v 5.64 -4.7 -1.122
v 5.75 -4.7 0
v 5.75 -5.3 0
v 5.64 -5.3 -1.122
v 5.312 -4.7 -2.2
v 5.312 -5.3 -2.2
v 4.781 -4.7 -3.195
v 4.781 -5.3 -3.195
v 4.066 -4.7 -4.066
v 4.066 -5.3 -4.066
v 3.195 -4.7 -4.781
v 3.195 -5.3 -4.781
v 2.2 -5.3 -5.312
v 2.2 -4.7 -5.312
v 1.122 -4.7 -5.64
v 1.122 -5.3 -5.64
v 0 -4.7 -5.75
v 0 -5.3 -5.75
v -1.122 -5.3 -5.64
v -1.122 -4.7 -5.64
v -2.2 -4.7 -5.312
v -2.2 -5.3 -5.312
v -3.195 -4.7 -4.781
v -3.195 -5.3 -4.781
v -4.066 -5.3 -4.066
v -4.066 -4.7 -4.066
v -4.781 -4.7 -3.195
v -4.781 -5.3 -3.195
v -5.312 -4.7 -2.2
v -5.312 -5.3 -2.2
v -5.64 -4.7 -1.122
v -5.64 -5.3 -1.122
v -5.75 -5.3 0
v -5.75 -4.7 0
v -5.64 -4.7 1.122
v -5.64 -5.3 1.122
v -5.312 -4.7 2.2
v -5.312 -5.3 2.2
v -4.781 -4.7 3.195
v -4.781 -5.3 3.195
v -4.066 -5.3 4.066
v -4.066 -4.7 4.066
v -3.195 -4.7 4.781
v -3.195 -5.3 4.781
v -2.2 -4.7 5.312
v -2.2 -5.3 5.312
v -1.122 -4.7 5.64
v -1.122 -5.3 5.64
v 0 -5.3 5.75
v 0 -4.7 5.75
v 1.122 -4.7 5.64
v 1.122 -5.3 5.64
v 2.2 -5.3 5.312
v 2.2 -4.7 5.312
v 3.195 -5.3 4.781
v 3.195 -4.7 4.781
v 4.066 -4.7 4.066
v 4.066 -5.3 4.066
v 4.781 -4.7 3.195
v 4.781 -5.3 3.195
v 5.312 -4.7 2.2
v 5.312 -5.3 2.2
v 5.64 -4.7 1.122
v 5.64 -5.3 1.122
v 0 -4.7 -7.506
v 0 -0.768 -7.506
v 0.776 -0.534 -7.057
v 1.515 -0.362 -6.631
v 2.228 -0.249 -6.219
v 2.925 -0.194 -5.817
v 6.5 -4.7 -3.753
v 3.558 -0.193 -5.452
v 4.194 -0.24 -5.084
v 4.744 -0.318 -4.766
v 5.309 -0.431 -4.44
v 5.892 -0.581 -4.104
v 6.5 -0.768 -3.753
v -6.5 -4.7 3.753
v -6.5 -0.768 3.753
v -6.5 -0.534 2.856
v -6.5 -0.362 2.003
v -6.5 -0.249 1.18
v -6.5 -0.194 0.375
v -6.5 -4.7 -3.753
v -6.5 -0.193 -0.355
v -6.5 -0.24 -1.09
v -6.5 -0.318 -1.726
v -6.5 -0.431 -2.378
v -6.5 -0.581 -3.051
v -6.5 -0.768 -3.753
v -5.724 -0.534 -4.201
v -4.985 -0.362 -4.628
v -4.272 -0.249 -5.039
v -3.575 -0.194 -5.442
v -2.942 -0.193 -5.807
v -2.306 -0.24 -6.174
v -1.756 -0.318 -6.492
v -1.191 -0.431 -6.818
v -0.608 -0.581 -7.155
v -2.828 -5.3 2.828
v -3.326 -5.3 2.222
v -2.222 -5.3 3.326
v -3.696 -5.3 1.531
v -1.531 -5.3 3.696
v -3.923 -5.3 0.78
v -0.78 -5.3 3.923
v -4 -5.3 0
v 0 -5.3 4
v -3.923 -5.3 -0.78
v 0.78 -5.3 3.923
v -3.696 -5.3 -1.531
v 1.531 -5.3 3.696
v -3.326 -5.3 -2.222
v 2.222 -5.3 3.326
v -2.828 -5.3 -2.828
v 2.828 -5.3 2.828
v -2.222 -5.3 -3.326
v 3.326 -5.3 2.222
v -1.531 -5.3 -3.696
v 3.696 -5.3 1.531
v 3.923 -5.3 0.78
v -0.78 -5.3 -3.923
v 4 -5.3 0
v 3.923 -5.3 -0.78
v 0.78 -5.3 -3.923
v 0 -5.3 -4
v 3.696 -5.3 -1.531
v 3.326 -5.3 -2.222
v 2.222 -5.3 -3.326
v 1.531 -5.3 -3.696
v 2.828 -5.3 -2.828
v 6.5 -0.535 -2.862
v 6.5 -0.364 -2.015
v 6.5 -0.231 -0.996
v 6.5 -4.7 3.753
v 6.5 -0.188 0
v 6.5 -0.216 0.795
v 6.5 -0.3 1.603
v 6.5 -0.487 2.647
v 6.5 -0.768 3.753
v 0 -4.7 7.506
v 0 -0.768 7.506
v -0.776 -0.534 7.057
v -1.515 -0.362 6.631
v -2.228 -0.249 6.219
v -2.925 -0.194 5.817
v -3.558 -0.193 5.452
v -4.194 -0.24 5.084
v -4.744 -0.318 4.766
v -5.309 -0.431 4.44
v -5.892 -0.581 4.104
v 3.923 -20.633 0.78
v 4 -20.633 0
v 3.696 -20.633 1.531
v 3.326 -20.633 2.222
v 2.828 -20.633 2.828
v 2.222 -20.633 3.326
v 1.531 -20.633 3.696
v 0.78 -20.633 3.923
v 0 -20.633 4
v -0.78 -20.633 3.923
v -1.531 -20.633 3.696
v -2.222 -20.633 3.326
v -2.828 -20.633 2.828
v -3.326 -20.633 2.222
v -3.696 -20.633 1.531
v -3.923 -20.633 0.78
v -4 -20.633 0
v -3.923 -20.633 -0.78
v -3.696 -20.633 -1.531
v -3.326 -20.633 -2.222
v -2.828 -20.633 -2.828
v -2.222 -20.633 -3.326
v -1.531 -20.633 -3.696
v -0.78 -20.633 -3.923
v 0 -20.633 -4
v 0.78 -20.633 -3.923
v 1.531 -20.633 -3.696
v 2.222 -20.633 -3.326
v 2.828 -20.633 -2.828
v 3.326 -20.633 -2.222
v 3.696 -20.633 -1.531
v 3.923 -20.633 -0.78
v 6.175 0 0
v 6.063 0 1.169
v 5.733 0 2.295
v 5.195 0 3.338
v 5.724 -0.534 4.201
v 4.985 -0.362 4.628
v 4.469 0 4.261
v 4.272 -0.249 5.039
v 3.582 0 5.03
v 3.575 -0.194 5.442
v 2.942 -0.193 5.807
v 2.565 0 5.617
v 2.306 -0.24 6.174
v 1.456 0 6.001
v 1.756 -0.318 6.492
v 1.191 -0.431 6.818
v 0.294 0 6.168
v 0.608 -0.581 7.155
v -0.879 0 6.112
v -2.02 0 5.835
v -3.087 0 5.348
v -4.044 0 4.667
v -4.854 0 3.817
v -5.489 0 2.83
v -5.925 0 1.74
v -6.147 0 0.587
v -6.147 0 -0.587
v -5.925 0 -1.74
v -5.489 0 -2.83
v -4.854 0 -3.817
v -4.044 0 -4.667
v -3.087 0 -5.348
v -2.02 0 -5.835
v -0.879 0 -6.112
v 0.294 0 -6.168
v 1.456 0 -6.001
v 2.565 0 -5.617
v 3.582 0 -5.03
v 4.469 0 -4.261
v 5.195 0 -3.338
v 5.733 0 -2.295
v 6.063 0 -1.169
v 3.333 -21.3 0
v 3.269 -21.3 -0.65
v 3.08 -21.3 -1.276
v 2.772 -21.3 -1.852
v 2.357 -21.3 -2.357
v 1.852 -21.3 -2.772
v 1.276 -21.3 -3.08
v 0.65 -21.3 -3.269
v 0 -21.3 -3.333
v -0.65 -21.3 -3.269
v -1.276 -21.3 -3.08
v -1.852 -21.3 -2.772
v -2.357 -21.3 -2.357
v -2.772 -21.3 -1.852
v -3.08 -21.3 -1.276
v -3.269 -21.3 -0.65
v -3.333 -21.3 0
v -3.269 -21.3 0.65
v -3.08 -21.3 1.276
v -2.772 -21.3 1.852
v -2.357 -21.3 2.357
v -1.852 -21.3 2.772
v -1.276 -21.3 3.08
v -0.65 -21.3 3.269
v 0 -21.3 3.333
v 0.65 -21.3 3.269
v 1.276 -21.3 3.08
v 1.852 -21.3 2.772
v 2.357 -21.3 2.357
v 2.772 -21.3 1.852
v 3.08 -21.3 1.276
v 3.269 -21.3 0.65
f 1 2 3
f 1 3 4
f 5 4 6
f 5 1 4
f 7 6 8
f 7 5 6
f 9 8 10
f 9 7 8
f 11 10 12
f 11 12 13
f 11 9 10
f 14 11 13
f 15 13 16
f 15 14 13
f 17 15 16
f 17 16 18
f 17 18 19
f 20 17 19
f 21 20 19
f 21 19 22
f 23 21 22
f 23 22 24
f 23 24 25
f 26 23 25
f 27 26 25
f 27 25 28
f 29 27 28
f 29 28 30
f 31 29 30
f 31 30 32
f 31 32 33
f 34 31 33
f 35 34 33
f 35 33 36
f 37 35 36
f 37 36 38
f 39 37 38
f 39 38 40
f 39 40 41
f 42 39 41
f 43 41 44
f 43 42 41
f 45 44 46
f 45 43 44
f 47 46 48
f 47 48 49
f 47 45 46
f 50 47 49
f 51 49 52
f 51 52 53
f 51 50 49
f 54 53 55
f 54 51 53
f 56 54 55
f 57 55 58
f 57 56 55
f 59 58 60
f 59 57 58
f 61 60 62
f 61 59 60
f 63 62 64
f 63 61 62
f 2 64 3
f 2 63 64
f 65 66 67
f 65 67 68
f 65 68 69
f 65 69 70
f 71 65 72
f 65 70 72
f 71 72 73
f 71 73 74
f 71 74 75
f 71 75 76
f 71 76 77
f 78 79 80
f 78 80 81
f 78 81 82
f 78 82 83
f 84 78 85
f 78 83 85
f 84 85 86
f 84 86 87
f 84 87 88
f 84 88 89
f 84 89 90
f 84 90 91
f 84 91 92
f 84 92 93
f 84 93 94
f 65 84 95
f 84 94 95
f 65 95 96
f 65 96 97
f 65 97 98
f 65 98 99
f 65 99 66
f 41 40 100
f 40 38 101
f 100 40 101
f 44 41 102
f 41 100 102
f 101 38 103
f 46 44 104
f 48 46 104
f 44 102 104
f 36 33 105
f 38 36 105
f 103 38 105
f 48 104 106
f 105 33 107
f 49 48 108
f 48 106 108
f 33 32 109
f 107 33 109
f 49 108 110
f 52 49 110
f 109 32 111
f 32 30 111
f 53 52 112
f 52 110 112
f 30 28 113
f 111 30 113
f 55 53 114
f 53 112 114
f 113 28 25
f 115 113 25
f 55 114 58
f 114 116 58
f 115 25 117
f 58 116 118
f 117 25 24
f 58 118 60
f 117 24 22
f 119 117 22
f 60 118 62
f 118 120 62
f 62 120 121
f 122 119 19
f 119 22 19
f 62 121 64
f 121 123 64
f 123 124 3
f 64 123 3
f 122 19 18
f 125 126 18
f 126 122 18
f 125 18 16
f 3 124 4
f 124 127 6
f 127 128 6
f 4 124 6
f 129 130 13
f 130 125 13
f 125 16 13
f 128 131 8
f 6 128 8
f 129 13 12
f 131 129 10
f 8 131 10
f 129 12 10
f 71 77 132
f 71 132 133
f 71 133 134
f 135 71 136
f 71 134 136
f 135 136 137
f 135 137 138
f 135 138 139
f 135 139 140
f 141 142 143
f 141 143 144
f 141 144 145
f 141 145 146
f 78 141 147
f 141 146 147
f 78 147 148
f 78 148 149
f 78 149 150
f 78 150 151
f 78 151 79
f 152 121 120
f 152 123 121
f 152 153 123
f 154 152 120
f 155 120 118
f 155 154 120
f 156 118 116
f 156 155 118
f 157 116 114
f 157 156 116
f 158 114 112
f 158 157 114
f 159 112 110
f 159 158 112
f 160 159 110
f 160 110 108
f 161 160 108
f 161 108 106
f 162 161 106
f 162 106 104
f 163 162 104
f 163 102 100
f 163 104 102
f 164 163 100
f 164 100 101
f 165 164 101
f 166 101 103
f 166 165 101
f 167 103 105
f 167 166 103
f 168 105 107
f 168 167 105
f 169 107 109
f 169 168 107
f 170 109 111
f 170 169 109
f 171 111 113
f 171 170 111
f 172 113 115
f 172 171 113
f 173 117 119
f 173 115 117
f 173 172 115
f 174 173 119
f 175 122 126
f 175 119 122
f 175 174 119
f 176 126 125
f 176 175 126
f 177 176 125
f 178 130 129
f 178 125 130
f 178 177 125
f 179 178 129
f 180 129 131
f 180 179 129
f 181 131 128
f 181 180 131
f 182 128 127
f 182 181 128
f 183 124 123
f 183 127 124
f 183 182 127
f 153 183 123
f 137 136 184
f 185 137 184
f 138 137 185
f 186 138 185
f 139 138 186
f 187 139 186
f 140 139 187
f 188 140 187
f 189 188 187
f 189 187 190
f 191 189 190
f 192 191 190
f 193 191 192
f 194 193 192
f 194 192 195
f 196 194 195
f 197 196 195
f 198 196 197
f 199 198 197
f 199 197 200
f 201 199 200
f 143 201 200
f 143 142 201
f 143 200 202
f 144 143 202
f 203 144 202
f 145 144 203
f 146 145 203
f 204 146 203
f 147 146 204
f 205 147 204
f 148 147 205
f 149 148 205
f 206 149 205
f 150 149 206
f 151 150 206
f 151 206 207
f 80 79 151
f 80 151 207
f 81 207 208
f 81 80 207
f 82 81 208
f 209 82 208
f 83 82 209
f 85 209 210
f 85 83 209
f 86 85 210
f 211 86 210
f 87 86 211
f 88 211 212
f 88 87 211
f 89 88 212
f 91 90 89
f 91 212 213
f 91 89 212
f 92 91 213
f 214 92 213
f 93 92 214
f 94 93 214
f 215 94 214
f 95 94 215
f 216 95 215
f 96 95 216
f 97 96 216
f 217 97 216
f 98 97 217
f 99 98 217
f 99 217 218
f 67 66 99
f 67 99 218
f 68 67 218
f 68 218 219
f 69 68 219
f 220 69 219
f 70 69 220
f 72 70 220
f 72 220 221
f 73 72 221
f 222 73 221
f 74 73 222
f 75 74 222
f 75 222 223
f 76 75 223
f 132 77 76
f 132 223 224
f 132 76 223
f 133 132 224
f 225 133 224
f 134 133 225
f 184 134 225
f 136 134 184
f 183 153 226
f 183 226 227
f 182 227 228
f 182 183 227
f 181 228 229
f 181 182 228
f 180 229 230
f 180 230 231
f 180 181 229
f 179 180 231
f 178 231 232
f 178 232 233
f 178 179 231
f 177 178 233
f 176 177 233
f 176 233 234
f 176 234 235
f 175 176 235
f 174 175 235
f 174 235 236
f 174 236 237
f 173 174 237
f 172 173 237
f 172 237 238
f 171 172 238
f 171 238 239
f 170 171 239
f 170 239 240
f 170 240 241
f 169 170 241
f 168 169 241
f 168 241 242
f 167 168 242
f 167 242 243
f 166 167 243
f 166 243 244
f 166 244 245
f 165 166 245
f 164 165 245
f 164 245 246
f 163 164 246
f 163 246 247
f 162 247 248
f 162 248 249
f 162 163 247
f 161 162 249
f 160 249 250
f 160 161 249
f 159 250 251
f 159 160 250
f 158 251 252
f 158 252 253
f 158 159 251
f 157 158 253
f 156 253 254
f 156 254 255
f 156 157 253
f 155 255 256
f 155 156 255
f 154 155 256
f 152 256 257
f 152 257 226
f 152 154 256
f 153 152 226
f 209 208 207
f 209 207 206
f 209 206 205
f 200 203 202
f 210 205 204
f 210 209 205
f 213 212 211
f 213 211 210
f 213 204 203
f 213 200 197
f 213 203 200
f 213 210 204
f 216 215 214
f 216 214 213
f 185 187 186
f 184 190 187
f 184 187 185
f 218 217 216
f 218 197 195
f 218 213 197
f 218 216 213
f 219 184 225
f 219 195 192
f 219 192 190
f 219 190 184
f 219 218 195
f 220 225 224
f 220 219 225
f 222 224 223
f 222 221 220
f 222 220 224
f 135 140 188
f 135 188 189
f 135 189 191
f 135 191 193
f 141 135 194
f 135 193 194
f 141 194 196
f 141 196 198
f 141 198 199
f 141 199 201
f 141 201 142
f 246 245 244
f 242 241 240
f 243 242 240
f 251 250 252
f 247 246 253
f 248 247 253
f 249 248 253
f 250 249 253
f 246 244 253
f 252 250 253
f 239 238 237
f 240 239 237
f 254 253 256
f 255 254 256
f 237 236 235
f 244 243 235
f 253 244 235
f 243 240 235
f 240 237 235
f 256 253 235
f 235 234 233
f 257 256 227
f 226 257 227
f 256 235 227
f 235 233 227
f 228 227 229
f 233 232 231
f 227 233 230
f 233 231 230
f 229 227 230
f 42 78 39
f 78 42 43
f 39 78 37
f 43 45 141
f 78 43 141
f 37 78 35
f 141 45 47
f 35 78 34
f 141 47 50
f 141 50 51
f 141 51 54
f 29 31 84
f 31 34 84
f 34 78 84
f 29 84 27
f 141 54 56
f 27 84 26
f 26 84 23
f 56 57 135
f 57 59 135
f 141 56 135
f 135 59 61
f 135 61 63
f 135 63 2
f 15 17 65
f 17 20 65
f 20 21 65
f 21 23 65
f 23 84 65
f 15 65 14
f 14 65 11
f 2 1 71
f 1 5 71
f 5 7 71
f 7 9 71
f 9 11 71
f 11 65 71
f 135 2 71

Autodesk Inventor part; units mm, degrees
ref_plane "YZ Plane" through (0, 0, 0) normal (1, 0, 0) x (0, 1, 0)
ref_plane "XZ Plane" through (0, 0, 0) normal (0, 1, 0) x (-1, 0, 0)
ref_plane "XY Plane" through (0, 0, 0) normal (0, 0, 1) x (1, 0, 0)
sketch "Sketch1" plane through (0, 0, 0) normal (0, 0, 1) x (1, 0, 0)
  line L0 (0, 0) -> (6.175, 0)
  line L1 (9.75, -2.064) -> (9.75, -4.7)
  line L2 (5.75, -5.3) -> (4, -5.3)
  line L3 (4, -5.3) -> (4, -21.3)
  line L4 (4, -21.3) -> (0, -21.3)
  line L5 (0, -21.3) -> (0, 0)
  line L6 (5.75, -5.3) -> (5.75, -4.7)
  line L7 (5.75, -4.7) -> (9.75, -4.7)
  line L8 (6.175, 0) -> (9.75, -2.064)
  dimension "d0" = 19.5
  dimension "d1" = 8
  dimension "d3" = 16
  dimension "d4" = 11.5
  dimension "d5" = 0.6
  dimension "d22" = 30
  dimension "d23" = 12.35
  dimension "d24" = 5.3
revolve "Revolution1" add sketch "Sketch1" angle 360 about axis through (0, -21.3, 0) along (0, 1, 0)
sketch "Sketch2" plane through (0, 0, 0) normal (0, 1, 0) x (1, 0, 0)
  line L0 (0, -7.5056) -> (-6.5, -3.7528)
  line L1 (-6.5, -3.7528) -> (-6.5, 3.7528)
  line L2 (-6.5, 3.7528) -> (0, 7.5056)
  line L3 (0, 7.5056) -> (6.5, 3.7528)
  line L4 (6.5, 3.7528) -> (6.5, -3.7528)
  line L5 (6.5, -3.7528) -> (0, -7.5056)
  circle A0 centre (0, 0) radius 9.75 projected
  point P0 (0, 0)
  point P1 (0, 0)
  dimension "d25" = 13
extrude "Extrusion1" cut sketch "Sketch2" against normal blind 5.3
thread "Thread1" size "M8x1.25" class "6g" standard "ISO Metric profile" length 15
chamfer "Chamfer1" distance 0.6667 angle 45 1 edges at (-4, -21.3, 0)
equation "\"d0\" = 1.5 * S_"
equation "\"d1\" = d1_"
equation "\"d3\" = L"
equation "\"d4\" = dw"
equation "\"d5\" = hw"
equation "\"d23\" = 0.95 * S_"
equation "\"d24\" = k"
equation "\"d14\" = b"
equation "\"d16\" = 0.0833333 * d"
equation "\"d25\" = S_"
equation "\"d26\" = k"
equation "\"d\" = 8"
equation "\"d1_\" = 8"
equation "\"S_\" = 13"
equation "\"k\" = 5.3"
equation "\"e\" = 14.2"
equation "\"L\" = 16"
equation "\"b\" = 15"
equation "\"Grip_Length\" = 1"
equation "\"dw\" = 11.5"
equation "\"hw\" = 0.6"
properties part number "Bolt A M8-6g×16(S13) GOST 7798-70" material "Steel, Mild"
